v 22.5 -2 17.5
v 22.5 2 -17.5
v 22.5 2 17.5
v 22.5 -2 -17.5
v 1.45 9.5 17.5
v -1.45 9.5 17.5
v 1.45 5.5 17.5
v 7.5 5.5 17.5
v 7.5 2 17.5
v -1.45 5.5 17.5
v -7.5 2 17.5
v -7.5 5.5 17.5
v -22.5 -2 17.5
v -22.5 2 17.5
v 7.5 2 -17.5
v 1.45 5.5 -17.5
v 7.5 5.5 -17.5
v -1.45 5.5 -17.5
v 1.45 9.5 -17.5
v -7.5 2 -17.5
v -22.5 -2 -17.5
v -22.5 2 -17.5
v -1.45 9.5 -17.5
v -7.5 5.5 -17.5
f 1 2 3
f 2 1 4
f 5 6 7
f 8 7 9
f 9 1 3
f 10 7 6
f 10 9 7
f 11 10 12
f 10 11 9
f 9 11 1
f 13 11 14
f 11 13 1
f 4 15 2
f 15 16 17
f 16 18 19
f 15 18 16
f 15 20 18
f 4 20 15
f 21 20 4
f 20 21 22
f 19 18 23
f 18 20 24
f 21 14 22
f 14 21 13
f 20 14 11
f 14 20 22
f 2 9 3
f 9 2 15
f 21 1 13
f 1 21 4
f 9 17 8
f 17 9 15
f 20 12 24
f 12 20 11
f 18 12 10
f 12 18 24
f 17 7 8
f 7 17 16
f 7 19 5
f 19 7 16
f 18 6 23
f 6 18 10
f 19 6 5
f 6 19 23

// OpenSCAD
l1=45;
l2=15;
l3=2.9;
w1=4;
w2=3.5;
w3=4;
h=35;

union(){
    cube([l1,w1,h],center=true);
    translate([0,w1/2+w2/2,0]) cube([l2,w2,h],center=true);
    translate([0,w1/2+w2+w3/2,0]) cube([l3,w3,h],center=true);
}
